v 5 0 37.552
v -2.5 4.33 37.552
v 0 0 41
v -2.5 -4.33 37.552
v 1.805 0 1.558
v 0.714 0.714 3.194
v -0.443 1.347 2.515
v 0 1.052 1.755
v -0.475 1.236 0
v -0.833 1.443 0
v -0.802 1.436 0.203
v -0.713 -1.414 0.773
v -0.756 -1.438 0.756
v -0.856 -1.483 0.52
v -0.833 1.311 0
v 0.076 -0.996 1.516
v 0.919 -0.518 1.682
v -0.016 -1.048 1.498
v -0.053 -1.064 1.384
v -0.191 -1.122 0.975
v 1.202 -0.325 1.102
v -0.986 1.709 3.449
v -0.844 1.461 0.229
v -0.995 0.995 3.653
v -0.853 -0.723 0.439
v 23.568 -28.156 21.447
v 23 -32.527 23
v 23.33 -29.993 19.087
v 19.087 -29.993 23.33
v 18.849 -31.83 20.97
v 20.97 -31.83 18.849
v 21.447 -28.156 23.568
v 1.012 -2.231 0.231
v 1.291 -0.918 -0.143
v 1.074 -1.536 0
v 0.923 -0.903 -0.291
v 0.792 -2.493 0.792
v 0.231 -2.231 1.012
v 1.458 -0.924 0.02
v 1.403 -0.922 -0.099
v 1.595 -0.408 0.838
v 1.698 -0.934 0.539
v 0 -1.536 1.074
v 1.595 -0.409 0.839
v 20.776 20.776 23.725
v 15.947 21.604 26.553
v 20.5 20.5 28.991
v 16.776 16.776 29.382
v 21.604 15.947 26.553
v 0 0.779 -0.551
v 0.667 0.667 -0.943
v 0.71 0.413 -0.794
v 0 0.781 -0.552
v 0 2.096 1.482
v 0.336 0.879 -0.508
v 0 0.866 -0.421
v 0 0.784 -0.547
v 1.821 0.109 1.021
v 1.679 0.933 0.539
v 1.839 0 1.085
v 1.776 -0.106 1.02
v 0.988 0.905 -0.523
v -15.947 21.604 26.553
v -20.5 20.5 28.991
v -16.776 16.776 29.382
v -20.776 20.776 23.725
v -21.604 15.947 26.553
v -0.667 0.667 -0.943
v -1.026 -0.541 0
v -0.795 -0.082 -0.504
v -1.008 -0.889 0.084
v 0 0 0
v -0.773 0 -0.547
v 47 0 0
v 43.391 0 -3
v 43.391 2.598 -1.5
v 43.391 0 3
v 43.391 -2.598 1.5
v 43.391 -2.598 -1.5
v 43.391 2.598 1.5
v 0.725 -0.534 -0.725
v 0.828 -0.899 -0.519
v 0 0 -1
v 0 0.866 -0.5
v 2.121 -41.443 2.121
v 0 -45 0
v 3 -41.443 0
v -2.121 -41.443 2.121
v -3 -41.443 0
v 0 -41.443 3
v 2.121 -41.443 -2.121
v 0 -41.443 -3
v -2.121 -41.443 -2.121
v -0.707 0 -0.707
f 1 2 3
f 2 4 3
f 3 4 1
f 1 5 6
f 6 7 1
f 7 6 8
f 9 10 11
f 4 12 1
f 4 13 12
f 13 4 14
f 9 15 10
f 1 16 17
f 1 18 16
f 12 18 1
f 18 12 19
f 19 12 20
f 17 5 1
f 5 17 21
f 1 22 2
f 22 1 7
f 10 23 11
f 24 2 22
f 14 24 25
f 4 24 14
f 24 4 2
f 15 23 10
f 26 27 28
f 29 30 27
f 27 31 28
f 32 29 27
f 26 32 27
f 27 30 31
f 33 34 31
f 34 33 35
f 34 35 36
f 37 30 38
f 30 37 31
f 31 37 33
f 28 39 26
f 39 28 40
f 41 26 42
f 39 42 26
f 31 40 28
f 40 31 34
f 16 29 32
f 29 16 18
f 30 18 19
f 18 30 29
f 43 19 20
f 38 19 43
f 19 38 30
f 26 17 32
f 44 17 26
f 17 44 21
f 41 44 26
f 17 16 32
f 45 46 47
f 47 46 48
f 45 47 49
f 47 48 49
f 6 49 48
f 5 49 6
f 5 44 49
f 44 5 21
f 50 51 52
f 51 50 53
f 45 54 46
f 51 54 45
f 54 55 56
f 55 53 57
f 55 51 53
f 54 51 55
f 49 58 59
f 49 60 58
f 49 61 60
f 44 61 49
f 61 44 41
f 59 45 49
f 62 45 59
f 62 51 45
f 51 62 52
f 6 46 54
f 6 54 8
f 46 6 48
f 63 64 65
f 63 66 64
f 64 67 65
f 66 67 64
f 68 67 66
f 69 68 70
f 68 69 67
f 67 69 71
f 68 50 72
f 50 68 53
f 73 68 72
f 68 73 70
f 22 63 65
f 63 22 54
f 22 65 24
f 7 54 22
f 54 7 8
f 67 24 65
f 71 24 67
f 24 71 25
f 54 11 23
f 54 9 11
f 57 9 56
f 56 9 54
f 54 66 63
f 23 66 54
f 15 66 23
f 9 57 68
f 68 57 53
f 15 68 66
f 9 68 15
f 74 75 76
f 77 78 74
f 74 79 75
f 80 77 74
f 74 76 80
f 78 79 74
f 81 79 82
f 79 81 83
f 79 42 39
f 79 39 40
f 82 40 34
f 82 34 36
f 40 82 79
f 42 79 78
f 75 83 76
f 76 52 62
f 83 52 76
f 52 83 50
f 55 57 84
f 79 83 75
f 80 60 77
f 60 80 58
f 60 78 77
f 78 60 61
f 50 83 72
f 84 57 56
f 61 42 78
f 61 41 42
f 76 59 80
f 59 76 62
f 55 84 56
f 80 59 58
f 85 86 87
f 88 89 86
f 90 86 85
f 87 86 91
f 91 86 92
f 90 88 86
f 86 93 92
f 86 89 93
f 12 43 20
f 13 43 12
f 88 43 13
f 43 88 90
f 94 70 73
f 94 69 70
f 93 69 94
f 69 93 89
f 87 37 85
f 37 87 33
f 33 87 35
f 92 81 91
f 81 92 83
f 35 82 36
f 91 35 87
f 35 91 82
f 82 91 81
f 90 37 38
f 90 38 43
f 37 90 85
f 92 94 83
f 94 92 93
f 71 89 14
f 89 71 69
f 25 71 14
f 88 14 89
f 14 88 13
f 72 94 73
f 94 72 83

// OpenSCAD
// file: thorn.scad
/** thorn
 *
 *  This module creates a single crystal thorn pointing upwards
 *
 *  height      total thorn height
 *  circumr     radius of thorn widest point
 *  seg         number of thorn segments
 *
 */
module thorn(
    height  = 15,
    circumr = 3,
    seg     = 5
) {
    // height of the upper stump is third root of total height
    stump_height    = pow( height, 1/3 );
    base_height     = height - stump_height;
    // translated upper stump
    translate( [0,0,base_height] )
        cylinder( r1=circumr, r2=0, h=stump_height, $fn=seg );
    // thorn base
    cylinder( r1=circumr/3, r2=circumr, h=base_height, $fn=seg );
}


thorn( 25, 5, 6 );
// main file
// needs module thorn!
use <thorn.scad>

/** crystal
 *
 * This module creates a crystal made of thorns (from module thorn) according
 * to given parameters. Each thorn is rotated as well.
 *
 * thorns = [[[rotx, roty, rotz], height, circumr, seg], ...]
 *      [rotx, roty, rotz]      rotate vector
 *      height, circumr, seg    thorn parameters
 *
 * thorns_example  = [[[0,0,0], 30, 3, 4], [[90,0,0], 25.5, 2.65, 7]];
 *
 */
module crystal( thorns=[] ) {
    for( t = thorns ) {
        rotate( t[0] )
            thorn( height=t[1], circumr=t[2], seg=t[3] );
    }
}

crystal( [
            [ [   0,   0,   0 ],  41,  5, 3 ],
            [ [  45,  45,   0 ],  46,  3, 6 ],
            [ [   0,  45,  45 ],  41,  4, 4 ],
            [ [   0, -45, -45 ],  41,  4, 4 ],
            [ [   0,  90,   0 ],  47,  3, 6 ],
            [ [  90,   0,   0 ],  45,  3, 8 ]
         ] );
